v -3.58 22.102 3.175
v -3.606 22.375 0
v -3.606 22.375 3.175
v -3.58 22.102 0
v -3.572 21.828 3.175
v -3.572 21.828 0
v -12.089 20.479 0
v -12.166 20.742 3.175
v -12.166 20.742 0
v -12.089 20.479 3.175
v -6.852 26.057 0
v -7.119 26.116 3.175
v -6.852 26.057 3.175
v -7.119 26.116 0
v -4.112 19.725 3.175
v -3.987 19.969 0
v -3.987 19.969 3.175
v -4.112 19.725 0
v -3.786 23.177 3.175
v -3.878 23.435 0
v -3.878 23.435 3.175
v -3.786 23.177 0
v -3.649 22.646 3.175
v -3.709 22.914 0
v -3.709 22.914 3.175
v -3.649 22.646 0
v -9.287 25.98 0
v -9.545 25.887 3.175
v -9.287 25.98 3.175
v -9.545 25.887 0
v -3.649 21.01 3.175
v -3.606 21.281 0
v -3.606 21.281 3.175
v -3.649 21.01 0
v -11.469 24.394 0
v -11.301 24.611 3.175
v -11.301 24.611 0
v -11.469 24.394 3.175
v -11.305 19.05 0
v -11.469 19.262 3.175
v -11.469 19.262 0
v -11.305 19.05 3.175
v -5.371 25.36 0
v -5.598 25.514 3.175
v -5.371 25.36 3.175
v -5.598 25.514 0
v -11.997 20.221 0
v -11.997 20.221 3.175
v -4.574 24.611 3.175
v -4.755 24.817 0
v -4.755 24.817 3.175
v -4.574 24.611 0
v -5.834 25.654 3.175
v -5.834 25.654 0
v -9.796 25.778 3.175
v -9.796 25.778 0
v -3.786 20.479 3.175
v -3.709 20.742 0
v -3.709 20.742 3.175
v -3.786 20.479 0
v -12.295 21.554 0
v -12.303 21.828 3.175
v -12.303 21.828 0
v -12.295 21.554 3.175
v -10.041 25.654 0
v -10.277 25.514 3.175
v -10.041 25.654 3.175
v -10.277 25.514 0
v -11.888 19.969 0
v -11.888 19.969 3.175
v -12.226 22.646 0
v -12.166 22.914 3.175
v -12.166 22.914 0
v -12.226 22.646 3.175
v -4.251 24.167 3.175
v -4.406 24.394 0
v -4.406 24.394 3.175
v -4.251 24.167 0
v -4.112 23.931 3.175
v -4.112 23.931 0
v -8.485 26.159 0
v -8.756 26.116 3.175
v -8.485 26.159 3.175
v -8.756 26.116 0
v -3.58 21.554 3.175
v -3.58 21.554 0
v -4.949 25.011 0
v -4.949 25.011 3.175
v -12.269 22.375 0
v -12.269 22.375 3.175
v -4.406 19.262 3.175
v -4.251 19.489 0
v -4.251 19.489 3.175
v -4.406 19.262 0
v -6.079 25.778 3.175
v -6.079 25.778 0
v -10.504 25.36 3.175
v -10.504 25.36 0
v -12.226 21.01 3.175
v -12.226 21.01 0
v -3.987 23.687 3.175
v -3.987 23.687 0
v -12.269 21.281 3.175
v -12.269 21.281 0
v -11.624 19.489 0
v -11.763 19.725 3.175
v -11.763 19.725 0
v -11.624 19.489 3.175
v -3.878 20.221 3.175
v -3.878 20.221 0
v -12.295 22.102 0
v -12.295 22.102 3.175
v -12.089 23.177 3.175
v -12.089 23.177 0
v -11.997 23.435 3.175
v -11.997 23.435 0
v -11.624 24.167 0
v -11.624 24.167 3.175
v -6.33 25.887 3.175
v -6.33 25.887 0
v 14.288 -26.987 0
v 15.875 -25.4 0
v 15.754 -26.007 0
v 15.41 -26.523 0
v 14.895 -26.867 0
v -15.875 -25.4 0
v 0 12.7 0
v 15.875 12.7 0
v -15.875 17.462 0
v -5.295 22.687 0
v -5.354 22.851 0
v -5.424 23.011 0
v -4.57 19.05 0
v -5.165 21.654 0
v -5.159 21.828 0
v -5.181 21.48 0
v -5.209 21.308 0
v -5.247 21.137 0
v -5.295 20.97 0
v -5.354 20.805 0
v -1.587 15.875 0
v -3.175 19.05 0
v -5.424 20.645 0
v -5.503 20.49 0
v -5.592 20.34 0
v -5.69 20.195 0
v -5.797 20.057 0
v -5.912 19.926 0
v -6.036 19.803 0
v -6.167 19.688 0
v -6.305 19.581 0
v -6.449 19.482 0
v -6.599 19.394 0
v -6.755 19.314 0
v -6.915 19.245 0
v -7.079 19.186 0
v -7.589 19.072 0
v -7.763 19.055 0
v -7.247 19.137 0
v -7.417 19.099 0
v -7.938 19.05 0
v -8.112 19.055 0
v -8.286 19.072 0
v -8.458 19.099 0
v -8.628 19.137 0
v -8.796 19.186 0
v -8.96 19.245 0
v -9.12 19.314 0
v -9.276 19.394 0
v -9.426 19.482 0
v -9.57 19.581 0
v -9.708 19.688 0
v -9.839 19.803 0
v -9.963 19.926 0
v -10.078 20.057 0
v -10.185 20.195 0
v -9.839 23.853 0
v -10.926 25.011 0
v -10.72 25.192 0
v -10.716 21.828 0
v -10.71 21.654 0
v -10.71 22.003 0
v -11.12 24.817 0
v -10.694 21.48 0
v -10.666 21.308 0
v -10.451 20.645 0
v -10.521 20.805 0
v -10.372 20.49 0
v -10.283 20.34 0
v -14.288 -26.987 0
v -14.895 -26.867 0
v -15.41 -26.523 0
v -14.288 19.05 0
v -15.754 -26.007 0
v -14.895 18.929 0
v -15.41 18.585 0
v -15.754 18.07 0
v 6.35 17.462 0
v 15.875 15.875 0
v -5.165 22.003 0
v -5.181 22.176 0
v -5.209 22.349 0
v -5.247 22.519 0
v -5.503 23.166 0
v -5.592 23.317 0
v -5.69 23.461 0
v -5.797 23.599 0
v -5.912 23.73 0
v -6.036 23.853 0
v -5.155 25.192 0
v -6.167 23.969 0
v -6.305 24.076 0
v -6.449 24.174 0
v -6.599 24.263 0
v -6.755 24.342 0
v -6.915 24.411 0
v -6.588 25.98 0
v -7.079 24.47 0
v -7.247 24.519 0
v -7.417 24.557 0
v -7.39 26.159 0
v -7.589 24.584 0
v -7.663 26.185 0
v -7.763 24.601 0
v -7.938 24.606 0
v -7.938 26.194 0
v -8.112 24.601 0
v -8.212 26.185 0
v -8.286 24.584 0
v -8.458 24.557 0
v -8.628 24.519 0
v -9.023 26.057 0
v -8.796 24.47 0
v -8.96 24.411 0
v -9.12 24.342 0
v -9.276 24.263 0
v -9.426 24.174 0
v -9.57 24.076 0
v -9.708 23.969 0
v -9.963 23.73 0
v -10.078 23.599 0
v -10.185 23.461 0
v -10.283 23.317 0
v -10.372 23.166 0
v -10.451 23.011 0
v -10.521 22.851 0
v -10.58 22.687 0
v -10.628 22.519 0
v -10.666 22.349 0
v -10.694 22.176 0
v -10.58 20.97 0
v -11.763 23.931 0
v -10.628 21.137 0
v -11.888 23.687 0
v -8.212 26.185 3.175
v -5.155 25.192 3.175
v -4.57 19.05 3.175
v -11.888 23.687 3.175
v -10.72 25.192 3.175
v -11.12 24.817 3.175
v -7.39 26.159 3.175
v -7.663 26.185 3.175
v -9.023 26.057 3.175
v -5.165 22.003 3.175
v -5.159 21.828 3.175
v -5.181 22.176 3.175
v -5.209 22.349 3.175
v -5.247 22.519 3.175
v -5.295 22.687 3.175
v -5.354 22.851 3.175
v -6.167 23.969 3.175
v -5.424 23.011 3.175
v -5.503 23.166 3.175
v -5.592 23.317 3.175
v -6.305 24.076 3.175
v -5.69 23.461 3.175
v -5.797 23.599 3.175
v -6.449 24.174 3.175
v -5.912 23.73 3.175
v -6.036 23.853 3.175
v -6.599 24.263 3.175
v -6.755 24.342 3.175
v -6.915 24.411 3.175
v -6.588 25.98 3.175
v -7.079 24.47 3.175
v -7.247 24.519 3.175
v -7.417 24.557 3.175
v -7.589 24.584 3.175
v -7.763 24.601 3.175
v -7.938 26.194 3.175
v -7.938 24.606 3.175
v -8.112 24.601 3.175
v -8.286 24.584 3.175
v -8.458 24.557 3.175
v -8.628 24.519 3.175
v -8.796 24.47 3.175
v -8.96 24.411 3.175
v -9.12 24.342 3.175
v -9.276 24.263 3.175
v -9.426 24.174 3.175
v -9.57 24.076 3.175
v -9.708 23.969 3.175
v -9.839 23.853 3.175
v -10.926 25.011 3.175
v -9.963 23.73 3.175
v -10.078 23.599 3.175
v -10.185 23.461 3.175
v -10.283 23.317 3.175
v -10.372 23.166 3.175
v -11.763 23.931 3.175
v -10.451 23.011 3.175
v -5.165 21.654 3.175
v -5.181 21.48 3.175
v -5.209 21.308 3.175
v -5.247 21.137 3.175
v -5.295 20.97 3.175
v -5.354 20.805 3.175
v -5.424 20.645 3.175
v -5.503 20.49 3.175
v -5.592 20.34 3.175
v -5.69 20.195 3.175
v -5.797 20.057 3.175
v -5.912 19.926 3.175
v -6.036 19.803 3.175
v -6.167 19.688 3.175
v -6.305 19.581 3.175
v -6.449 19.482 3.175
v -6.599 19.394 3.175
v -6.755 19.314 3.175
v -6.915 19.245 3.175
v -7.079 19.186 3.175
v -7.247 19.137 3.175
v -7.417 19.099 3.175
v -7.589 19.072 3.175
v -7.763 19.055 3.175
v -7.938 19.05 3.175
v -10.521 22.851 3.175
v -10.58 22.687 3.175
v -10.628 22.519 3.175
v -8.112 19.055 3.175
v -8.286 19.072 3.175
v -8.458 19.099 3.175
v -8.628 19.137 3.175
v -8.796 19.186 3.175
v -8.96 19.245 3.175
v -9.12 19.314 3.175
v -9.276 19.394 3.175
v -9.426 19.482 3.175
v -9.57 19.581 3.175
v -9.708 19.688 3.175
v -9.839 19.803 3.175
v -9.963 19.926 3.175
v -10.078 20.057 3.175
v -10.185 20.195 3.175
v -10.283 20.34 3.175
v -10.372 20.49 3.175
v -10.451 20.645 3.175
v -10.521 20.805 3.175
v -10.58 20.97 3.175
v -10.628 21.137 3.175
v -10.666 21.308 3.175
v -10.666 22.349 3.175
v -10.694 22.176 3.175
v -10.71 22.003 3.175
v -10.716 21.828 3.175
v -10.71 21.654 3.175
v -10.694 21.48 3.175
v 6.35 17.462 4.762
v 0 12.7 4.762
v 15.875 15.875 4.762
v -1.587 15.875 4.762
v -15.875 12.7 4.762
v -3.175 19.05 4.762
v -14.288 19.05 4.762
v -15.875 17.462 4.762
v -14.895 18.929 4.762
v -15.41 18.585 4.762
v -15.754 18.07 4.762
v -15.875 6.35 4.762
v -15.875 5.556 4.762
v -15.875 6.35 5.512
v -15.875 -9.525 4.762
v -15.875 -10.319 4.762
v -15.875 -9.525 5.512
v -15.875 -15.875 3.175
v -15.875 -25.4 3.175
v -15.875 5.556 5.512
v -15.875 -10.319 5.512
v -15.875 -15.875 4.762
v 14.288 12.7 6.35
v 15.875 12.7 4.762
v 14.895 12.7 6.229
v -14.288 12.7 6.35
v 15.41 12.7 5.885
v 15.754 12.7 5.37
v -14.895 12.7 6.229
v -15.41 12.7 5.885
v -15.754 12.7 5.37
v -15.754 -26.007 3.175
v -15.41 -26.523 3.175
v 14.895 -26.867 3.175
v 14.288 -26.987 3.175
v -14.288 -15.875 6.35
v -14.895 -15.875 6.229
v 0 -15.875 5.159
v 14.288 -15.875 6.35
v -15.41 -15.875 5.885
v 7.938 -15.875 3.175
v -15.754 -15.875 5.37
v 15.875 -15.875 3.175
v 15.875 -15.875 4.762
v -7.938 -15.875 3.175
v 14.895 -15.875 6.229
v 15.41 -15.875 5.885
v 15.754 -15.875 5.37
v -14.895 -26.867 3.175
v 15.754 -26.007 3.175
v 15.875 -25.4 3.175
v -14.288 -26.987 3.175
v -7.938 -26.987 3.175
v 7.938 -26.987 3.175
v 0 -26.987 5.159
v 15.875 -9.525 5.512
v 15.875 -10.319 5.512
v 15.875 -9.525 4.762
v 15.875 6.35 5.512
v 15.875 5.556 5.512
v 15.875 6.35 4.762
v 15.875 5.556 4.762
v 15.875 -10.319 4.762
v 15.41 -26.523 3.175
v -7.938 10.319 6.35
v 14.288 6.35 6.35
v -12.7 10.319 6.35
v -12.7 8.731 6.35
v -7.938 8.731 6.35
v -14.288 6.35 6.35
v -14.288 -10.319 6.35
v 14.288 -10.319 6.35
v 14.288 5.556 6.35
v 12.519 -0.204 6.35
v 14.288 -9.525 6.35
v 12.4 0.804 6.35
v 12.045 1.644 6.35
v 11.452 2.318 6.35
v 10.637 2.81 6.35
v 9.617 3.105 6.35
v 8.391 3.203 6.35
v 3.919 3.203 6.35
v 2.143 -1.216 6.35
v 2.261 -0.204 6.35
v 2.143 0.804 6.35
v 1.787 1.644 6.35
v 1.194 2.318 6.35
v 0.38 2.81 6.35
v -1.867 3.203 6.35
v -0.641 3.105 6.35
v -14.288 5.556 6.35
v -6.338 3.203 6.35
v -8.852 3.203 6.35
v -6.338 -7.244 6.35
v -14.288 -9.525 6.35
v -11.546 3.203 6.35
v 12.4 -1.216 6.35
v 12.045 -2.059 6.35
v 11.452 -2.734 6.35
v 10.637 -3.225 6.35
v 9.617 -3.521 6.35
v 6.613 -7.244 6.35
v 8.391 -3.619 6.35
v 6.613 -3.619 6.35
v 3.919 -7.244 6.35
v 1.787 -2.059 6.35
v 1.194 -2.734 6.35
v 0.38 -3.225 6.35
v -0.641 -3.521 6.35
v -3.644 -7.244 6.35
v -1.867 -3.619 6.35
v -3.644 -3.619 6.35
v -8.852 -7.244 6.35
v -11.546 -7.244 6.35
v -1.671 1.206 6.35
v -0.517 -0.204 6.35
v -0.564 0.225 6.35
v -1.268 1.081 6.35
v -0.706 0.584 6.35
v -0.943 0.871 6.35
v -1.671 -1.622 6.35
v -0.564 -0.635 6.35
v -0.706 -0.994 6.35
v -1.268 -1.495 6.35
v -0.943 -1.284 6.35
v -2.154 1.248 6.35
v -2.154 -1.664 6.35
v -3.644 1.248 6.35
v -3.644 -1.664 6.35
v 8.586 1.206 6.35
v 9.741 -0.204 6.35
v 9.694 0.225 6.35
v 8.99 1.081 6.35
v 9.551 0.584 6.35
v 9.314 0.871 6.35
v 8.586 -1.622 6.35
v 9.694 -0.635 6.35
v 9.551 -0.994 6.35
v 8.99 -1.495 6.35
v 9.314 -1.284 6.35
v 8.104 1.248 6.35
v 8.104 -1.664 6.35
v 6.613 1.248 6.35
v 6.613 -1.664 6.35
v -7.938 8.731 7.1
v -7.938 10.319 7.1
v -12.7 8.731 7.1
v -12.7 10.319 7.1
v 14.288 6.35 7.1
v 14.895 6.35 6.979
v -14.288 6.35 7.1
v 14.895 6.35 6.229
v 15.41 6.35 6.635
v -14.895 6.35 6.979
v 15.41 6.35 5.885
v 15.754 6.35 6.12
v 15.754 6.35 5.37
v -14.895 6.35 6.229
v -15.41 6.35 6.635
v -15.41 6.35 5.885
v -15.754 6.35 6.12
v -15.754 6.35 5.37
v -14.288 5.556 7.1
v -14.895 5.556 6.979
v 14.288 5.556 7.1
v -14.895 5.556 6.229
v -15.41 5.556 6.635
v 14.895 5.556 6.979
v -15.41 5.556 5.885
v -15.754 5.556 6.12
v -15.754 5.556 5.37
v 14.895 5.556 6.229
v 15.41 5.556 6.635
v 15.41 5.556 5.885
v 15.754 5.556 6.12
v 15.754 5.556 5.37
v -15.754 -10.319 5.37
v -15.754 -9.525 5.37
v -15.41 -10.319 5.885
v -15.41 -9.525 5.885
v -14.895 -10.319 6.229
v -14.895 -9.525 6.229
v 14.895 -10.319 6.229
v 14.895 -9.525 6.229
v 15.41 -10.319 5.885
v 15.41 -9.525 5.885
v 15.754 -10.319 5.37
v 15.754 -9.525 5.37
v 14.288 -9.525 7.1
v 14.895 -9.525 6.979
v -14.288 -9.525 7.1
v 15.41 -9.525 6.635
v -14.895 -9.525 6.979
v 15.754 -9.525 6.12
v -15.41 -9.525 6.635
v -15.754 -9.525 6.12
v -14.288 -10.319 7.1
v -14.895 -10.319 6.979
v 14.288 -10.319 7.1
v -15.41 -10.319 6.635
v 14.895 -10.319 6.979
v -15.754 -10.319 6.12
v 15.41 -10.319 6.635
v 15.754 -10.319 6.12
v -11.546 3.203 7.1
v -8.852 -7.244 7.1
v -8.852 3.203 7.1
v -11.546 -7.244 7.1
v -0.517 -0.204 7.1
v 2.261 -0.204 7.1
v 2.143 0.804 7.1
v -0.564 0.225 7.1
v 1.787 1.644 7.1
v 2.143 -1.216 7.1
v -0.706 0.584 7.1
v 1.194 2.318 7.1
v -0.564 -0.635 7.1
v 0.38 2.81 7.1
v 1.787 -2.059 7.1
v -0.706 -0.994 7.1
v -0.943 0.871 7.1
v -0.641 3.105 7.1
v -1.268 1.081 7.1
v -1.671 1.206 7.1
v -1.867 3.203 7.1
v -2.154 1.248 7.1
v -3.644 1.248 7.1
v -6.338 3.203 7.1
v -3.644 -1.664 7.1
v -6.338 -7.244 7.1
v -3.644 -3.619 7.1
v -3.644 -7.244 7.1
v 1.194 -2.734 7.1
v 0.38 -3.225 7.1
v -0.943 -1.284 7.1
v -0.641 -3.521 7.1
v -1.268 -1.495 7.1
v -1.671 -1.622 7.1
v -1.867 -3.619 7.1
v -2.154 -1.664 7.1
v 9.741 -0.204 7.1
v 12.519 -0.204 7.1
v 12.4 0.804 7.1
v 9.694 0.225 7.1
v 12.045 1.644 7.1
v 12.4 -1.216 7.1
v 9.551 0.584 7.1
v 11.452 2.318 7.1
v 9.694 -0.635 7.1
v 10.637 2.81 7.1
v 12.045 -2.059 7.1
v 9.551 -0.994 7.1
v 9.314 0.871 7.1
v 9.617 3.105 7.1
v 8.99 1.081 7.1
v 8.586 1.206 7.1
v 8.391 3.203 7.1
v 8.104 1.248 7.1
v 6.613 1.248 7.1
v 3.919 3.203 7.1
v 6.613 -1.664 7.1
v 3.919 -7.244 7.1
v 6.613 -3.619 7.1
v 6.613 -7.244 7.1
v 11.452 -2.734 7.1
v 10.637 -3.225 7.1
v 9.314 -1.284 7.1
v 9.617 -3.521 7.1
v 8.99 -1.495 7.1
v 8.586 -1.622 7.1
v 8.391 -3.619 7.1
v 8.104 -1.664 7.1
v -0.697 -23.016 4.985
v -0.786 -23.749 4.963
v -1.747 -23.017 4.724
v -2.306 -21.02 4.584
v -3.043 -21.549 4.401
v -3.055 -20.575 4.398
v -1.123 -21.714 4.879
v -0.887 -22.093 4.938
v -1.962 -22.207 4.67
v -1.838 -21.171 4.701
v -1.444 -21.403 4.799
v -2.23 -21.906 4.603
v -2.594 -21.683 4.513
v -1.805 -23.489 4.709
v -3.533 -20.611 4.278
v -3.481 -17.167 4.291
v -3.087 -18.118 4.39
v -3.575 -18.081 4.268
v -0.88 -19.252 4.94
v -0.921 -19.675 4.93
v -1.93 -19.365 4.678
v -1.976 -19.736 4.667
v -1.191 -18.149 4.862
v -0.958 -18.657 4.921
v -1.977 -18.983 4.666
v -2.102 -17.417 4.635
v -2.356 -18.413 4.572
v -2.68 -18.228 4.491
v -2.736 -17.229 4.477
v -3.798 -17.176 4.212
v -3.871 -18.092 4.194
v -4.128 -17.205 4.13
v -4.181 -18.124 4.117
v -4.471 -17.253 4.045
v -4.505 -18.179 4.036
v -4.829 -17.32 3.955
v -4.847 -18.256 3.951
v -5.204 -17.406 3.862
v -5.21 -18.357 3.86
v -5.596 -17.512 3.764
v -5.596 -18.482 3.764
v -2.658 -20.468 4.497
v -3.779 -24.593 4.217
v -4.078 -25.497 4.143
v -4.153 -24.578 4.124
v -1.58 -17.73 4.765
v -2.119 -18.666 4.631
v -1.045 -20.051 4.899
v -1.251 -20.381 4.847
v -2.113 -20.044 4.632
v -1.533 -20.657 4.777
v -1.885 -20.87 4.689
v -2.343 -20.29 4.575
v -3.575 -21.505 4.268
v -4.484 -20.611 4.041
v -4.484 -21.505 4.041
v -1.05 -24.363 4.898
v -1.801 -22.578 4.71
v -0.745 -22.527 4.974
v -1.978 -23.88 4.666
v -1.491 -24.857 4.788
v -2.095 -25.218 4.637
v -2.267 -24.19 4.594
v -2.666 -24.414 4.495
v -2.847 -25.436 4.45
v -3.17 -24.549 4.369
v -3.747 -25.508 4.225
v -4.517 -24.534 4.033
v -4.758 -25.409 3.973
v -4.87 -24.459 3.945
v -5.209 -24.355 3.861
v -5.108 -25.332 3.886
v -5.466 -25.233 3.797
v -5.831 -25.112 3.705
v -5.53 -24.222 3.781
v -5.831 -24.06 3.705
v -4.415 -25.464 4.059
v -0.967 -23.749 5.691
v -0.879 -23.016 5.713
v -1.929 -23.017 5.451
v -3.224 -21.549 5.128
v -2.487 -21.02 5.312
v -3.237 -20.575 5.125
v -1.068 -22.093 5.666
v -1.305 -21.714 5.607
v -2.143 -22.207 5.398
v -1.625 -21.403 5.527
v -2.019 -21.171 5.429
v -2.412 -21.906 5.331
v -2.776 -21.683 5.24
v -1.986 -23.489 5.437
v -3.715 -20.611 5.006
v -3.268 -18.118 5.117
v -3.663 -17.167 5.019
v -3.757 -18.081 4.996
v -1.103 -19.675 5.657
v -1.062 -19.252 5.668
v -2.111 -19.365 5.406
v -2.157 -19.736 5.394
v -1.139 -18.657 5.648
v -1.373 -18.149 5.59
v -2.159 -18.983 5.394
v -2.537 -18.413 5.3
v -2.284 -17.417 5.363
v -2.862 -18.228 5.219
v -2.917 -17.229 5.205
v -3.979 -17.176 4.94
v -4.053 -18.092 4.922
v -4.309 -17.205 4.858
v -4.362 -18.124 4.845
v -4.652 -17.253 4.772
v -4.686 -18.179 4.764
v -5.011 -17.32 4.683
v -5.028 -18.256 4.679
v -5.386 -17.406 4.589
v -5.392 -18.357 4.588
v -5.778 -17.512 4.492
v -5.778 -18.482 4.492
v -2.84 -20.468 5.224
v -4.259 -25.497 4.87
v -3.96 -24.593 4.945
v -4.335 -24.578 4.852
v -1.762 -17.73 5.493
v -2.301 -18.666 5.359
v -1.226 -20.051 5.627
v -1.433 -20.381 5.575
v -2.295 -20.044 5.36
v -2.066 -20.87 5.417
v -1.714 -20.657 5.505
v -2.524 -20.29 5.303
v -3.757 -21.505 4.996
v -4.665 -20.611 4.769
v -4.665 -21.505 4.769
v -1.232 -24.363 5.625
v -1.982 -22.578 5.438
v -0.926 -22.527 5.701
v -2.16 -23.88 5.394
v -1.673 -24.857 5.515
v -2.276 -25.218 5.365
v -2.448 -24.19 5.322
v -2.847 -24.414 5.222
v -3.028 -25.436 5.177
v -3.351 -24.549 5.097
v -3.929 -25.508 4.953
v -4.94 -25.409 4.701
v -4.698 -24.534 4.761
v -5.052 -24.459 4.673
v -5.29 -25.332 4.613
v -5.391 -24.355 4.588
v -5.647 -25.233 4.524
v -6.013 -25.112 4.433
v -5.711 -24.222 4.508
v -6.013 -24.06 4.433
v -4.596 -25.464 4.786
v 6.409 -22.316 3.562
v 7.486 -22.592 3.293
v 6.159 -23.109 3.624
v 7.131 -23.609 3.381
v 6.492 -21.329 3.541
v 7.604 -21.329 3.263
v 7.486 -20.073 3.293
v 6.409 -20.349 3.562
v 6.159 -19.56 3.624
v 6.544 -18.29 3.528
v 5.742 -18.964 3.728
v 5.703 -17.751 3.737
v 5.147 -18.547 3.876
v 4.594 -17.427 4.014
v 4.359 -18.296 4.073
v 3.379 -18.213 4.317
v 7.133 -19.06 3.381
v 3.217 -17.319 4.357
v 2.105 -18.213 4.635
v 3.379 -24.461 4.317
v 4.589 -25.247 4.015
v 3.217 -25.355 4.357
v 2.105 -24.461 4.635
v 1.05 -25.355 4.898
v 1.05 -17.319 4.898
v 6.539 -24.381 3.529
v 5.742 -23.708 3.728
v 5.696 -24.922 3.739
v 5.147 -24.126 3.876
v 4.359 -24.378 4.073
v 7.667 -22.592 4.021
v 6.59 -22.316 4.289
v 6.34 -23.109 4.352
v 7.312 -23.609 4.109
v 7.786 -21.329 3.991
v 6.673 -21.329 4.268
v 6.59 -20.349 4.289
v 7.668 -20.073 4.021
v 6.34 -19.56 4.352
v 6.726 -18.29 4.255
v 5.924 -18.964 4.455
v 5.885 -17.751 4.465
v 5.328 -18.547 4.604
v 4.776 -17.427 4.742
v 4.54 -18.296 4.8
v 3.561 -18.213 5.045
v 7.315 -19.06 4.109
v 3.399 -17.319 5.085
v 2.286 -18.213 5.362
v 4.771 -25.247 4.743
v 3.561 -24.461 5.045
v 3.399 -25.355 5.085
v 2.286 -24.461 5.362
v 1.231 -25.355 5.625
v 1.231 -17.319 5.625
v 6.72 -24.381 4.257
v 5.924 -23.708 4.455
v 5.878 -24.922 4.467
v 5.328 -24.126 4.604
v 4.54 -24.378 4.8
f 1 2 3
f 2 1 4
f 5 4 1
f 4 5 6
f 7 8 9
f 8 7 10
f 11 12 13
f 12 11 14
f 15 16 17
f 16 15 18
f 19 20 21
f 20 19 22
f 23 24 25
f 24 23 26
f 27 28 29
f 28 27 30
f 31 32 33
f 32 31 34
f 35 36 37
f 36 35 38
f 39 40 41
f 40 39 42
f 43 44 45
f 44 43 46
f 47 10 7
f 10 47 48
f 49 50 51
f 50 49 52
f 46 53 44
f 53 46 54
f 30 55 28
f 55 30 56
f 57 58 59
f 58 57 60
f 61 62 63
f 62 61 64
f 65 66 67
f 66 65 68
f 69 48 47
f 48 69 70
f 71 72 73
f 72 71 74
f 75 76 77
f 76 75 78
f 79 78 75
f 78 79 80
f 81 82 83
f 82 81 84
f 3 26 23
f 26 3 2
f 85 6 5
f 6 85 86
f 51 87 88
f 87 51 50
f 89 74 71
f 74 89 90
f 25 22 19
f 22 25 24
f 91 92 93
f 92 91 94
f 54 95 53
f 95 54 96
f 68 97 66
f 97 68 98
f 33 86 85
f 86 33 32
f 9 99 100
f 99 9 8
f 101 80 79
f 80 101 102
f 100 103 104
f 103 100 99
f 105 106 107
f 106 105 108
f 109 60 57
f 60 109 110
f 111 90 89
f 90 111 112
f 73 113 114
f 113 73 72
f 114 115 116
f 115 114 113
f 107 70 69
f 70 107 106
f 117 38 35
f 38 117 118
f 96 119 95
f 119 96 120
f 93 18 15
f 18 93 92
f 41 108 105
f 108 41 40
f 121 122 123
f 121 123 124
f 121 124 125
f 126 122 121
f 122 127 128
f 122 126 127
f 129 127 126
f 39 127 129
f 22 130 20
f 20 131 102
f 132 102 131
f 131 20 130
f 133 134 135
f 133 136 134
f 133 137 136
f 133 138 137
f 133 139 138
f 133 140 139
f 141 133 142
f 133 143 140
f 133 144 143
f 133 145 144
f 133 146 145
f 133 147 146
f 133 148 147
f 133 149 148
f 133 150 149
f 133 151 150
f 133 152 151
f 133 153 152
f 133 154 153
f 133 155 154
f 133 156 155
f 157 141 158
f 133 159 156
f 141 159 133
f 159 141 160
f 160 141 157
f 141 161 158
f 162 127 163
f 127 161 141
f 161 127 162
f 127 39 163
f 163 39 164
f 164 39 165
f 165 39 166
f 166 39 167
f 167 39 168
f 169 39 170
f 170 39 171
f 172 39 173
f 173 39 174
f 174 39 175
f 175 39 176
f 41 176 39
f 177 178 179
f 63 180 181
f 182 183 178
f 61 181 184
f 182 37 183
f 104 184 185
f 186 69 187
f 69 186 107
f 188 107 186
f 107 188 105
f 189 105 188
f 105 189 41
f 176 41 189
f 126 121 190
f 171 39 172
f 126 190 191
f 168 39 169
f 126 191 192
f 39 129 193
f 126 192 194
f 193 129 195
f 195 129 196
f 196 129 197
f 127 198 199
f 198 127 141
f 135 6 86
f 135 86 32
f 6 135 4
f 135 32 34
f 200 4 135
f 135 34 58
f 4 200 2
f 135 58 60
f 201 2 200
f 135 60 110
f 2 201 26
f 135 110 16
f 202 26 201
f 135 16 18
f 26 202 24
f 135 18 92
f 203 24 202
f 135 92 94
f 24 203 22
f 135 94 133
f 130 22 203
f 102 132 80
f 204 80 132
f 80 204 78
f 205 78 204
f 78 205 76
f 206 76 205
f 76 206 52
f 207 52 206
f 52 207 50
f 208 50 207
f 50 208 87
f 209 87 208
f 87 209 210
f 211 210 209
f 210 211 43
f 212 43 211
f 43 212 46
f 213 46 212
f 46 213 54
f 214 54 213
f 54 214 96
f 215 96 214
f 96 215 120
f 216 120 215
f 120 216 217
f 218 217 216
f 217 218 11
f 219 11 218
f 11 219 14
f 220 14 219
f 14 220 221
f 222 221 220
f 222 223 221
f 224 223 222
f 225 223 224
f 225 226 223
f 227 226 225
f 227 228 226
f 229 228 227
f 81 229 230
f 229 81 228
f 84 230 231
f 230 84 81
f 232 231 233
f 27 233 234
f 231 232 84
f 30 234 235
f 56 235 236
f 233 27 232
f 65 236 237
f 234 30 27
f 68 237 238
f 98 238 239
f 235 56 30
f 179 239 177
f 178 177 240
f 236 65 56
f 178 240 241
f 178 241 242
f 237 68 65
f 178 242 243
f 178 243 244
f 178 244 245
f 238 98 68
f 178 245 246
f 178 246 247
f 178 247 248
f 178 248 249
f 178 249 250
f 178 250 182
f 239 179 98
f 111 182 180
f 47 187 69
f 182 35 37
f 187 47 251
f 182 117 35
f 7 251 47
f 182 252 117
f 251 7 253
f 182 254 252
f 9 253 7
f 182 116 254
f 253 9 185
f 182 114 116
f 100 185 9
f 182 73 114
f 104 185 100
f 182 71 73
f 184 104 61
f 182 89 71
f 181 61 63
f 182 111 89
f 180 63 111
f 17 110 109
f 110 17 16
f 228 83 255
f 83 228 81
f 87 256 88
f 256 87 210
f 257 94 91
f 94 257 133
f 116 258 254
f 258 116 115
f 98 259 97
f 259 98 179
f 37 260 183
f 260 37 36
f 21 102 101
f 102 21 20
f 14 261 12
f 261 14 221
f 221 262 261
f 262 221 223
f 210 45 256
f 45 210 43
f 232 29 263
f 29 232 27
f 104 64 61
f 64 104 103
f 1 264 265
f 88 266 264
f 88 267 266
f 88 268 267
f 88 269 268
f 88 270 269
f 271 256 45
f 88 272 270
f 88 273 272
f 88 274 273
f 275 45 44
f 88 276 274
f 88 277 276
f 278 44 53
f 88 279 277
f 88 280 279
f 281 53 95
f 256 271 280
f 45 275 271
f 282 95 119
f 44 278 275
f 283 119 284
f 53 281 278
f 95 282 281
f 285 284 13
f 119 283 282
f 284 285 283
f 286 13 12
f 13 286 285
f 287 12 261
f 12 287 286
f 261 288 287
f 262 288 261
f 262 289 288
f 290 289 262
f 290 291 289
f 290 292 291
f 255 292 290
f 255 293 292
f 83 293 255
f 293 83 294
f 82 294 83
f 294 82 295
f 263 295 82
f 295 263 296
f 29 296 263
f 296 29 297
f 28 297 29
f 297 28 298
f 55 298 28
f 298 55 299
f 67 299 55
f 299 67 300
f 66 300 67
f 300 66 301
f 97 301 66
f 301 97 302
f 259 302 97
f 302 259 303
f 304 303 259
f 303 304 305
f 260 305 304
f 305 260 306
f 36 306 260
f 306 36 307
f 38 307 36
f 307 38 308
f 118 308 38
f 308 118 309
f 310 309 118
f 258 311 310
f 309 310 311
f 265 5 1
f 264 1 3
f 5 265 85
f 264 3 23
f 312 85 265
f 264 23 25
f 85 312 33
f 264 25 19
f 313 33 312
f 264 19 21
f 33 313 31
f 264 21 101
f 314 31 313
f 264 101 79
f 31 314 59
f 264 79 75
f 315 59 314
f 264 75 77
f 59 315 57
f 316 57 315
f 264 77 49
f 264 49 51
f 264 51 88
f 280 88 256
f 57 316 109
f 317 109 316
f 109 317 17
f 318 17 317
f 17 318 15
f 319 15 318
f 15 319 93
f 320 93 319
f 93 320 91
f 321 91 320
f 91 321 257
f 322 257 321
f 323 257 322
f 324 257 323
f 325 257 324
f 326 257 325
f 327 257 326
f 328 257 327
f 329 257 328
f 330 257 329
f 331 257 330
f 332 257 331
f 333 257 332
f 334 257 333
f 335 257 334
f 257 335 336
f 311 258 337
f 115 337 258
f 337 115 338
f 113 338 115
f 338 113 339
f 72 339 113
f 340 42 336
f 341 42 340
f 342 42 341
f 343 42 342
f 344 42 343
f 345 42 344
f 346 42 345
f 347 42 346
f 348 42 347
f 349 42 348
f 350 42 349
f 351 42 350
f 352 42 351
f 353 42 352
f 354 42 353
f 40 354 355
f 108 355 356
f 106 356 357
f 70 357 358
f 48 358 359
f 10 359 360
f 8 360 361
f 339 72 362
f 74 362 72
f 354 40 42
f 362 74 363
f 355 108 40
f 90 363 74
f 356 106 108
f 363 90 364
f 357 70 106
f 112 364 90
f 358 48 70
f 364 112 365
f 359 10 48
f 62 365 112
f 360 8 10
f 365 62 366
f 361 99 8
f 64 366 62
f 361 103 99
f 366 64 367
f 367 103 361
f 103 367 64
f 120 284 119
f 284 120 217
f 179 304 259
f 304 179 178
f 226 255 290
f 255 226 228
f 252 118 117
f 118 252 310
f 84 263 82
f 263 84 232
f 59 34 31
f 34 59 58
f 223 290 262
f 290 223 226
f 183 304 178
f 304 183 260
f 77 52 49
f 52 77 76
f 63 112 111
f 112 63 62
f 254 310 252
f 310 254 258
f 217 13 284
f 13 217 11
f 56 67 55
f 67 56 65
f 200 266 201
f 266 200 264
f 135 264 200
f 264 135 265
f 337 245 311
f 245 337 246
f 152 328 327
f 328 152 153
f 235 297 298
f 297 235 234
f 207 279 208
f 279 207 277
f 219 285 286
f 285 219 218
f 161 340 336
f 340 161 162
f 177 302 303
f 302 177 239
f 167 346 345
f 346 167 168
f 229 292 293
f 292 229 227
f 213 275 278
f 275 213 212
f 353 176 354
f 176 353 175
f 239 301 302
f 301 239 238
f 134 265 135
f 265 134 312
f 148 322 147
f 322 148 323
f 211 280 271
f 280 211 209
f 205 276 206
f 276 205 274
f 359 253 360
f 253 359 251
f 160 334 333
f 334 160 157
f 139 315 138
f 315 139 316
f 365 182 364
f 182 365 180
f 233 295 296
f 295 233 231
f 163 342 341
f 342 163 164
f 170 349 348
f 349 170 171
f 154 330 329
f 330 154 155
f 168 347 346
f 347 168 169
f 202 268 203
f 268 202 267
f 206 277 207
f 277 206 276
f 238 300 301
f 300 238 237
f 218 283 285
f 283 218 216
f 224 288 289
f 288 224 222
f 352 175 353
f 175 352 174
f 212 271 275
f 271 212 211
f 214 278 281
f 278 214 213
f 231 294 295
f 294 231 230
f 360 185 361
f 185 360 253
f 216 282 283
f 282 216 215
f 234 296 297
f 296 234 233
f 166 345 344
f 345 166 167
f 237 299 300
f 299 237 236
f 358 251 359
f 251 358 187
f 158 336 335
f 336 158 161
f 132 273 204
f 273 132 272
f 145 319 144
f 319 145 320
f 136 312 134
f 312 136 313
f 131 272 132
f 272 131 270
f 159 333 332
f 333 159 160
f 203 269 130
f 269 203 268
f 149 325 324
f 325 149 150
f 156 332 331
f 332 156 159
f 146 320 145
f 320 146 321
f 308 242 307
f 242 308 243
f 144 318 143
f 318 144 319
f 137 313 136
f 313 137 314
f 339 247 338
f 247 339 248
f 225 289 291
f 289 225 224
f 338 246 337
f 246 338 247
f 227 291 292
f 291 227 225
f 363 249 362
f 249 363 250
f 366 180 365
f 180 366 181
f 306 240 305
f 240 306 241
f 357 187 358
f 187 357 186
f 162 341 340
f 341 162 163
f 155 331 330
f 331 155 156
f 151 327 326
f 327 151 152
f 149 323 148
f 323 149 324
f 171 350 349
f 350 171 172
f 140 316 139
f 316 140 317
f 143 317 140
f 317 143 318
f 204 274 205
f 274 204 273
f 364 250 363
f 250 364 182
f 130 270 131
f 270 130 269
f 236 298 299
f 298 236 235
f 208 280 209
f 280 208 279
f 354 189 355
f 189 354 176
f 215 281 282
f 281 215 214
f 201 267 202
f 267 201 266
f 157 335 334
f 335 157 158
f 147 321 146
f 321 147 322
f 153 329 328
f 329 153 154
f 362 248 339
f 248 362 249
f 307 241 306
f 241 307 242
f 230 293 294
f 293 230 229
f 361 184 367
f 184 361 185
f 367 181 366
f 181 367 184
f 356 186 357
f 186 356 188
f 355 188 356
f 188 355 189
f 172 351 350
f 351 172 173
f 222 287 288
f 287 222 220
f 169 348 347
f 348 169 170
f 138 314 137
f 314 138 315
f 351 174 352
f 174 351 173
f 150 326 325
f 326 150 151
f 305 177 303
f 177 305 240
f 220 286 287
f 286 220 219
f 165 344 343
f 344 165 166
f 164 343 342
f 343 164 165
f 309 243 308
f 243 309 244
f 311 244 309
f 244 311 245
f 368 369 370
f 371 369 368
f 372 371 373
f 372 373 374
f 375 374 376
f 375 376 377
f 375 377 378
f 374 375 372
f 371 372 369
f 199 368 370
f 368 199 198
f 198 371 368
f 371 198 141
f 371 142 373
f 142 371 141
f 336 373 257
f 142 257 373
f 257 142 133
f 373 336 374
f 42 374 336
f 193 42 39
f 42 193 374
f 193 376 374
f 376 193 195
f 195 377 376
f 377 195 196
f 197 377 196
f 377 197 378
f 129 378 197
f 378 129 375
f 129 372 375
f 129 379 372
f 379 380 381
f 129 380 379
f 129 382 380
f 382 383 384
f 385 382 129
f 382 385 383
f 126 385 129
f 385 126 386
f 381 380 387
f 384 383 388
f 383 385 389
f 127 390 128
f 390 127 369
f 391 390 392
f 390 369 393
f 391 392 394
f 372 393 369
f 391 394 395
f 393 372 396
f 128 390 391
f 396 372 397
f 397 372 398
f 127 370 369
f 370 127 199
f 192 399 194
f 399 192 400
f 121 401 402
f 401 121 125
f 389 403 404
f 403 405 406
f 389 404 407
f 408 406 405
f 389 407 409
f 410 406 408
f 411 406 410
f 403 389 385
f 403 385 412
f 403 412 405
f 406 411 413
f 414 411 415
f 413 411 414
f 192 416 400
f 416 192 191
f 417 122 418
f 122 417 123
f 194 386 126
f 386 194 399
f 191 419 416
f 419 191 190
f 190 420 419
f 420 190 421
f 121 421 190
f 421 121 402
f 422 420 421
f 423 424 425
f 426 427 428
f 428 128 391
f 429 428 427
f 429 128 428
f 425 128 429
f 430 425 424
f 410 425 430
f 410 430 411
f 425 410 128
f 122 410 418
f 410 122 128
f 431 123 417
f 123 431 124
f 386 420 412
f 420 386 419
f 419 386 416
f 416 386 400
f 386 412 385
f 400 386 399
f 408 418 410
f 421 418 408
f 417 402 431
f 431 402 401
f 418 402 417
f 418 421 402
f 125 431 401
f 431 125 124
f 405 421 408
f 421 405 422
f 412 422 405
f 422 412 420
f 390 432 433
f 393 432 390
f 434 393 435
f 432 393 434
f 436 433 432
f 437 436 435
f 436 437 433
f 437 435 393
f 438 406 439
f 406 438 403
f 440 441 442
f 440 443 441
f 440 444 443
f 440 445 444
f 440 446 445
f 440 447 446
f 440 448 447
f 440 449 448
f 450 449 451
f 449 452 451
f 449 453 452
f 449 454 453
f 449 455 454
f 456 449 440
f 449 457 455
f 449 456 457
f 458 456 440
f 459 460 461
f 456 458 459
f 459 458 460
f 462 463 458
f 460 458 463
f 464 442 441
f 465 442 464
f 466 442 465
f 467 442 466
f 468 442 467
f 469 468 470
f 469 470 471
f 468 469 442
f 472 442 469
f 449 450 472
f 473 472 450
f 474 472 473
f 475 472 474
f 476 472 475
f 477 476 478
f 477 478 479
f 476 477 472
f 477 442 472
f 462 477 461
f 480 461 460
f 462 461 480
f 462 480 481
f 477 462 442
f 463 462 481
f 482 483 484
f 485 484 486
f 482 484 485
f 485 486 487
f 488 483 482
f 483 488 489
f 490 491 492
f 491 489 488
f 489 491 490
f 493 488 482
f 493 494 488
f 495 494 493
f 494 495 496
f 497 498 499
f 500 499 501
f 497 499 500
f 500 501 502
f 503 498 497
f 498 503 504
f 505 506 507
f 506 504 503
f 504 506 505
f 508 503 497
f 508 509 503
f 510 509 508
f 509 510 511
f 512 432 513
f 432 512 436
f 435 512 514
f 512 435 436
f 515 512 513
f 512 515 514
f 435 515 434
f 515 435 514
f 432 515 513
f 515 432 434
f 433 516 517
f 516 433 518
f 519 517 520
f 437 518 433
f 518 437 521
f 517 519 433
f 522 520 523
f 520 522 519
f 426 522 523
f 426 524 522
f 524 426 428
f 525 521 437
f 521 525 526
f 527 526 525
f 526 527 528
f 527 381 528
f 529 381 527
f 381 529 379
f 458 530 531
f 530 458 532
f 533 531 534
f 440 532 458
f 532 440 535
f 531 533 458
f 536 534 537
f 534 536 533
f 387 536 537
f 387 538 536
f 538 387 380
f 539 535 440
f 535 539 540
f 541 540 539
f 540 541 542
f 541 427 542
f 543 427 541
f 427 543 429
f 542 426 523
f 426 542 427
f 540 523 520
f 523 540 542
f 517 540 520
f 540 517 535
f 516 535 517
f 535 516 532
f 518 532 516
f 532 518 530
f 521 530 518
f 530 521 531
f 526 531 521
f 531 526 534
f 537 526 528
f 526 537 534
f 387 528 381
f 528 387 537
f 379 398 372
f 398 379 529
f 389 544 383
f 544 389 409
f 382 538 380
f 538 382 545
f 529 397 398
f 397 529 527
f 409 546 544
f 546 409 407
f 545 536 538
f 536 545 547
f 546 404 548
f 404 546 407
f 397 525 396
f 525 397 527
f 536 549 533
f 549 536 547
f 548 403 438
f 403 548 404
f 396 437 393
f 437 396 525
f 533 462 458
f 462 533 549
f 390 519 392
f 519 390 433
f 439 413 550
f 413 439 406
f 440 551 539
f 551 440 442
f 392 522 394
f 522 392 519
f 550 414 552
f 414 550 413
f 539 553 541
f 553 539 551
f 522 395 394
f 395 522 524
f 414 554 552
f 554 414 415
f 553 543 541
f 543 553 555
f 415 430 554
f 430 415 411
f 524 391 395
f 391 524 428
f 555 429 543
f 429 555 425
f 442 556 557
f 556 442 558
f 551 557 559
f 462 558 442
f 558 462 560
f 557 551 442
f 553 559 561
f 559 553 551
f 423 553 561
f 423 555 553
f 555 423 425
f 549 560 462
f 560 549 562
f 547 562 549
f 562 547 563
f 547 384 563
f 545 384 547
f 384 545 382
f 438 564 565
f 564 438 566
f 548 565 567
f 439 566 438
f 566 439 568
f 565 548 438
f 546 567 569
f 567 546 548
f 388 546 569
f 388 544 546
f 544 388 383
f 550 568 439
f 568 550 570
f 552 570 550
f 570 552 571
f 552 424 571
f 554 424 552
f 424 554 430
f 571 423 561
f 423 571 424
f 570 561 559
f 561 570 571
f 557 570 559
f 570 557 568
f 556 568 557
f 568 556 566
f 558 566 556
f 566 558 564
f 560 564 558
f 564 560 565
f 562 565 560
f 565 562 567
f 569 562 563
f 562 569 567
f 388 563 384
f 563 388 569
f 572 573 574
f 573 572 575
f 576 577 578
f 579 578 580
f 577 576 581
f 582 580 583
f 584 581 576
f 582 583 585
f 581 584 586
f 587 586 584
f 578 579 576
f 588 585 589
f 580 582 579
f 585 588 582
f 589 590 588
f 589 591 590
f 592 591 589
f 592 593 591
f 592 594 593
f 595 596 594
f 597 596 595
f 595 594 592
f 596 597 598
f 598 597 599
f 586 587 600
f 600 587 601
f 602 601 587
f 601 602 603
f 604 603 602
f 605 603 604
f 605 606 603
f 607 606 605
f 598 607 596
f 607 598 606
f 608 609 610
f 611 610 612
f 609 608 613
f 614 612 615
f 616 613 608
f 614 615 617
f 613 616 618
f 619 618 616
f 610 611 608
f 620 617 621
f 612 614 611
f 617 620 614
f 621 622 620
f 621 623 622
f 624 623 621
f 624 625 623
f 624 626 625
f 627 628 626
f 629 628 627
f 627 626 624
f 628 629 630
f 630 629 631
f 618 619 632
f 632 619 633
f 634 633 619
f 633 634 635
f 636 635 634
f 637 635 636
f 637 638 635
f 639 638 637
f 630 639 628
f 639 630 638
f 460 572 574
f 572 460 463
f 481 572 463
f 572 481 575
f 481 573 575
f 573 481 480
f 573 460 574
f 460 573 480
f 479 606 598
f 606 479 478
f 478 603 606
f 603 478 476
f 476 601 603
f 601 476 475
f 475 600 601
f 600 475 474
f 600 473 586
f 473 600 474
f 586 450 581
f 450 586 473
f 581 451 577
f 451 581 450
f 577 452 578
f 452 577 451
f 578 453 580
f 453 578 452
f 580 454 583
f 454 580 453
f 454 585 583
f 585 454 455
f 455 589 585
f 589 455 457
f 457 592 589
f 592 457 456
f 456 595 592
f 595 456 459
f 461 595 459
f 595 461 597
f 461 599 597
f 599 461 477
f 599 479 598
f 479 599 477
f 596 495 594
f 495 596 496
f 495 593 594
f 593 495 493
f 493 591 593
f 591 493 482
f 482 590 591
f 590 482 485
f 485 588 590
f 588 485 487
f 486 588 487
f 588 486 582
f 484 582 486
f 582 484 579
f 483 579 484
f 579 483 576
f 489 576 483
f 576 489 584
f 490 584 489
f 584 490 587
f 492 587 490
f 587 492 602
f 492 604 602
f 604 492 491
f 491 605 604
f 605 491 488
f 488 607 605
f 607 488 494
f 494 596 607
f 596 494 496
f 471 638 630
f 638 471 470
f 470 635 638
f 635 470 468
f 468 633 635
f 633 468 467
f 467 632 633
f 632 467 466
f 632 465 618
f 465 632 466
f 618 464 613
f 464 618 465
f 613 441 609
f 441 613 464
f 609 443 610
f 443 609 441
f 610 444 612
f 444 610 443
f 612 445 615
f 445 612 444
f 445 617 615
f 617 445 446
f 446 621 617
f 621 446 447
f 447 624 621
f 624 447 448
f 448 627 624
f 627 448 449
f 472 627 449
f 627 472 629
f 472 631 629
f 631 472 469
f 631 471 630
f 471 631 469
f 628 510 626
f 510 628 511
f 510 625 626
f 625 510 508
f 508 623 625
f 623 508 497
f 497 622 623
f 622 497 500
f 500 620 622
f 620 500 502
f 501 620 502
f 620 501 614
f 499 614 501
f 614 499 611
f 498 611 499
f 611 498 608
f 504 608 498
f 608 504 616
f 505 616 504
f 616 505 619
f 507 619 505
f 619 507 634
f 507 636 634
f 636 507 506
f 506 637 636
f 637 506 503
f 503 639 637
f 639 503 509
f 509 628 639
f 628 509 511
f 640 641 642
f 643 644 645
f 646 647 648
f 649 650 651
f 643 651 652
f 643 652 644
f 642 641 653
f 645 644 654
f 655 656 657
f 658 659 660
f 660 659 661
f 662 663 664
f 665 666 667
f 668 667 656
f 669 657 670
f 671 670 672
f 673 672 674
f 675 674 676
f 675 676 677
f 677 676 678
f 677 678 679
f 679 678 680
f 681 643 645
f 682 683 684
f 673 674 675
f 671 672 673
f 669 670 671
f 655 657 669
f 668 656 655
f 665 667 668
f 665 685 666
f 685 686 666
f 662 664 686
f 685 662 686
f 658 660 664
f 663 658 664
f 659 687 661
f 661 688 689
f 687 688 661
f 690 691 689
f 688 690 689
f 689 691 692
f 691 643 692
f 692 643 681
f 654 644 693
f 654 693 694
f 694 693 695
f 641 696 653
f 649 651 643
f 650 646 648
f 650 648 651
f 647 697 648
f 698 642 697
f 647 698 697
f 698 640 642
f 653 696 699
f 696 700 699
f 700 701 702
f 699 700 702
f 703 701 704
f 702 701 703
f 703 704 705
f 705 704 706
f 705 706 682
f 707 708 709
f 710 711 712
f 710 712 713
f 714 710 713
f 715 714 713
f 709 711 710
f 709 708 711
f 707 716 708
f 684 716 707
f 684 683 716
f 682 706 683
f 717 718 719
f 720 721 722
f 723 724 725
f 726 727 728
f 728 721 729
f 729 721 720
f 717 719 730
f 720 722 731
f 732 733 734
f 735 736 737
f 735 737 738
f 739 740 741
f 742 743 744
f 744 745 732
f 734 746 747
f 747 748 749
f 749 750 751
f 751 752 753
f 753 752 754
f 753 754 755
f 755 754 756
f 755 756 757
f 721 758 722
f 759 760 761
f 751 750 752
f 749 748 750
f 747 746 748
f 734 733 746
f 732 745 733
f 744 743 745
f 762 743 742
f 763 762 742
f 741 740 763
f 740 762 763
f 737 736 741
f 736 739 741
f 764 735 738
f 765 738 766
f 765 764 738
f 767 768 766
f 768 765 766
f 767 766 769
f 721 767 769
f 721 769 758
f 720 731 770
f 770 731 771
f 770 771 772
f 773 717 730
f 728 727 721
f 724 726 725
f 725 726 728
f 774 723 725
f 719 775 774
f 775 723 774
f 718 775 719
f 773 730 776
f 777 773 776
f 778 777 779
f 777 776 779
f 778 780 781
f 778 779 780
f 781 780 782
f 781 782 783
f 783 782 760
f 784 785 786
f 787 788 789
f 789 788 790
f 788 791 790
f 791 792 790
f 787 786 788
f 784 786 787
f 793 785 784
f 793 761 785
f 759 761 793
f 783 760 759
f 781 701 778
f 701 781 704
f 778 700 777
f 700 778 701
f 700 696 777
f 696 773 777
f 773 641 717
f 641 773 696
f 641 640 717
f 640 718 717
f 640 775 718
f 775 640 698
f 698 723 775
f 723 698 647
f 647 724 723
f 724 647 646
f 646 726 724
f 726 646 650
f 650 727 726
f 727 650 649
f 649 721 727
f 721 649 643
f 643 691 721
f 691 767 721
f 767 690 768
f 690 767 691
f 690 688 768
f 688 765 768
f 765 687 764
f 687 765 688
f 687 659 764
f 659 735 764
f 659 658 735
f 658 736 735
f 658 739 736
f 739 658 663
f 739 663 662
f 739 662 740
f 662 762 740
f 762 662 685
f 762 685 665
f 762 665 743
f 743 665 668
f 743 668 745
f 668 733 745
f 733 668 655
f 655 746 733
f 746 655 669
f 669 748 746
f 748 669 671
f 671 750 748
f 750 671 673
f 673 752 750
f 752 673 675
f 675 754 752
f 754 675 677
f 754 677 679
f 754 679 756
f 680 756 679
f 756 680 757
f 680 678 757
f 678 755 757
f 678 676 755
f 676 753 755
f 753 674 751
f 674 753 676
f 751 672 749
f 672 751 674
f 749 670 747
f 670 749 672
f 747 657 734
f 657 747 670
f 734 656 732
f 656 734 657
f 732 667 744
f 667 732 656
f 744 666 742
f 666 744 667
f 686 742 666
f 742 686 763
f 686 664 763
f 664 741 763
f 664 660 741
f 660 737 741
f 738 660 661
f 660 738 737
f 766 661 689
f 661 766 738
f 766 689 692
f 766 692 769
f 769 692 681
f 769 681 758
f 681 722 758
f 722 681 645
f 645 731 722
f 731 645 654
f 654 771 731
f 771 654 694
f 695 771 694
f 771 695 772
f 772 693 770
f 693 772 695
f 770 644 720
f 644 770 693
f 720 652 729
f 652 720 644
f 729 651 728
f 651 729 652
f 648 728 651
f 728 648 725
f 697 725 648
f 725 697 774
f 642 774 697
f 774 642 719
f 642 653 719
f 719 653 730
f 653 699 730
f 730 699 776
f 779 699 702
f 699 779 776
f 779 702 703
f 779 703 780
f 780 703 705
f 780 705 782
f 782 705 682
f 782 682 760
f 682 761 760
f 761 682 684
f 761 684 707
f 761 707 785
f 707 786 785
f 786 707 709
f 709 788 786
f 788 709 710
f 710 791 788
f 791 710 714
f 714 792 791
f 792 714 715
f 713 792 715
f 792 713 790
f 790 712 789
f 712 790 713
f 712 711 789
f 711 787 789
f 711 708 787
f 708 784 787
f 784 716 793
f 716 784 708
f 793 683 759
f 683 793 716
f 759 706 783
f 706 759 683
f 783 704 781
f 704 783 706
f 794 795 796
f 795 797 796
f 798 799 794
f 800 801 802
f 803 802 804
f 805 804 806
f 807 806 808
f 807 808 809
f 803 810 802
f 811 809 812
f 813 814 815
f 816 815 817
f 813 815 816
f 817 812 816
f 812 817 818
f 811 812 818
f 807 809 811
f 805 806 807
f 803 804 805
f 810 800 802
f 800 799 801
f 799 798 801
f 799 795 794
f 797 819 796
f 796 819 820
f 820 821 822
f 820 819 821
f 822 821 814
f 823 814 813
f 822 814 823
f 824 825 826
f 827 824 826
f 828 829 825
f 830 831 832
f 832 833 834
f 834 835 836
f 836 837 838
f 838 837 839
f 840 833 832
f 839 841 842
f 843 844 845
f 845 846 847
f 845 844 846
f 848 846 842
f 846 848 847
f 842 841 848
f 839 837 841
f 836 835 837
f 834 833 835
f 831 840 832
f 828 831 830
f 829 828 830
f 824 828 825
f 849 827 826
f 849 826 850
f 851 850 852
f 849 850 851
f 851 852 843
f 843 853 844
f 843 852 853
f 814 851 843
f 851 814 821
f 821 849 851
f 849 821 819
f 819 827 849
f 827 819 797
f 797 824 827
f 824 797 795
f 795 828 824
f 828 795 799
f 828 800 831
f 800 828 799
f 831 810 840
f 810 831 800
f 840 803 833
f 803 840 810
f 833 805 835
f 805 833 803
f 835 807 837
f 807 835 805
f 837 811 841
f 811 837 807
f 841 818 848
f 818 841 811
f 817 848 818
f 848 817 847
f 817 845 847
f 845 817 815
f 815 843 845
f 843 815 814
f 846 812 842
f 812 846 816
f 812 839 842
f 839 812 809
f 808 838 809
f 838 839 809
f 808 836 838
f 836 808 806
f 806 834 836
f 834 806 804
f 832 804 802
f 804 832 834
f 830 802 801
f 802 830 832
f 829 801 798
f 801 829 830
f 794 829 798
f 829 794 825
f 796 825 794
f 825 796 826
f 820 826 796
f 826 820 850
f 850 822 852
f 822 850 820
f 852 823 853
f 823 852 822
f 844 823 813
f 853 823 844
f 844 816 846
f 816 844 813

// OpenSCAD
/*
 * A 3D interpretation of the PWG IPP logo, with keychain grommet added.
 *
 * Copyright © 2016 by Michael R Sweet.
 */

/* Parameters */
$finalwidth = 1.25 * 25.4;
$scaling    = $finalwidth / 20.0;
$bumpout    = 0.75 / $scaling;

scale(v=[$scaling,$scaling,$scaling]) {
    /* COLOR: BLACK */
    color([0.25,0.25,0.25]) {
        
        /* Keyring grommet */
        translate(v=[-5,13.75,0]) {
            difference() {
                cylinder(h=2, r=2.75, $fn=100);
                translate(v=[0,0,-1]) {
                    cylinder(h=4, r=1.75, $fn=100);
                }
            }   
        }
        /* Scanner head */
        linear_extrude(height=3) {
            polygon(points=[[-10,8],[-10,11],[-9-cos(22.5),11+sin(22.5)],[-9-cos(45),11+sin(45)],[-9-cos(67.5),11+sin(67.5)],[-9,12],[-2,12],[-1,10],[4,11],[10,10],[0,8]]);
        }
        /* Base for "3D" */
        linear_extrude(height=2) {
            polygon(points=[[-10,-16],[-10,-10],[10,-10],[10,-16],[9+cos(22.5),-16-sin(22.5)],[9+cos(45),-16-sin(45)],[9+cos(67.5),-16-sin(67.5)],[9,-17],[-9,-17],[-9-cos(67.5),-16-sin(67.5)],[-9-cos(45),-16-sin(45)],[-9-cos(22.5),-16-sin(22.5)]]);
        }
        /* Small wedge for "3D" */
        translate(v=[0,-10,2]) {
            rotate(a=[90,0,0]) {
                linear_extrude(height=7) {
                    polygon(points=[[-5,0],[0,1.25],[5,0]]);
                }
            }
        }
    }
    
    /* COLOR: PWG BLUE */
    color([75/255,90/255,168/255]) {
        /* Center body */
        translate(v=[0,8,0]) {
            rotate(a=[90,0,0]) {
                linear_extrude(height=18) {
                    polygon(points=[[-10,0],[-10,3],[-9-cos(22.5),3+sin(22.5)],[-9-cos(45),3+sin(45)],[-9-cos(67.5),3+sin(67.5)],[-9,4],[9,4],[9+cos(67.5),3+sin(67.5)],[9+cos(45),3+sin(45)],[9+cos(22.5),3+sin(22.5)],[10,3],[10,0]]);
                }
            }
        }
    }
    
    /* COLOR: WHITE */
    color([1,1,1]) {
        /* Activity light */
        translate(v=[0,0,4]) {
            linear_extrude(height=$bumpout) {
                polygon(points=[[-8,5.5],[-8,6.5],[-5,6.5],[-5,5.5]]);
            }
        }
        /* Top line */
        translate(v=[0,4,0]) {
            rotate(a=[90,0,0]) {
                linear_extrude(height=0.5) {
                    $bottom = 3;
                    $top    = $bottom + $bumpout;
                    polygon(points=[[-10,$bottom],[-10,$top],[-9-cos(22.5),$top+sin(22.5)],[-9-cos(45),$top+sin(45)],[-9-cos(67.5),$top+sin(67.5)],[-9,$top+1],[9,$top+1],[9+cos(67.5),$top+sin(67.5)],[9+cos(45),$top+sin(45)],[9+cos(22.5),$top+sin(22.5)],[10,$top],[10,$bottom],[9+cos(22.5),$bottom+sin(22.5)],[9+cos(45),$bottom+sin(45)],[9+cos(67.5),$bottom+sin(67.5)],[9,$bottom+1],[-9,$bottom+1],[-9-cos(67.5),$bottom+sin(67.5)],[-9-cos(45),$bottom+sin(45)],[-9-cos(22.5),$bottom+sin(22.5)]]);
                }
            }
        }
        /* Bottom line */
        translate(v=[0,-6,0]) {
            rotate(a=[90,0,0]) {
                linear_extrude(height=0.5) {
                    $bottom = 3;
                    $top    = $bottom + $bumpout;
                    polygon(points=[[-10,$bottom],[-10,$top],[-9-cos(22.5),$top+sin(22.5)],[-9-cos(45),$top+sin(45)],[-9-cos(67.5),$top+sin(67.5)],[-9,$top+1],[9,$top+1],[9+cos(67.5),$top+sin(67.5)],[9+cos(45),$top+sin(45)],[9+cos(22.5),$top+sin(22.5)],[10,$top],[10,$bottom],[9+cos(22.5),$bottom+sin(22.5)],[9+cos(45),$bottom+sin(45)],[9+cos(67.5),$bottom+sin(67.5)],[9,$bottom+1],[-9,$bottom+1],[-9-cos(67.5),$bottom+sin(67.5)],[-9-cos(45),$bottom+sin(45)],[-9-cos(22.5),$bottom+sin(22.5)]]);
                }
            }
        }
        /* "IPP" */
        translate(v=[0,-1.35,4]) {
            linear_extrude(height=$bumpout) {
                text("IPP", font="Helvetica Neue:style=Bold", size=6.5, halign="center", valign="center");
            }
        }
        /* "3D" */
        translate(v=[0,-13.5,3.25]) {
            rotate(a=[0,-14,0]) {
                linear_extrude(height=$bumpout) {
                    text("3", font="Helvetica Neue:style=Bold+Italic", size=5, halign="right", valign="center");
                }
            }
        }
        translate(v=[0,-13.5,3.25]) {
            rotate(a=[0,14,0]) {
                linear_extrude(height=$bumpout) {
                    text("D", font="Helvetica Neue:style=Bold+Italic", size=5, halign="left", valign="center");
                }
            }
        }
    }
}
